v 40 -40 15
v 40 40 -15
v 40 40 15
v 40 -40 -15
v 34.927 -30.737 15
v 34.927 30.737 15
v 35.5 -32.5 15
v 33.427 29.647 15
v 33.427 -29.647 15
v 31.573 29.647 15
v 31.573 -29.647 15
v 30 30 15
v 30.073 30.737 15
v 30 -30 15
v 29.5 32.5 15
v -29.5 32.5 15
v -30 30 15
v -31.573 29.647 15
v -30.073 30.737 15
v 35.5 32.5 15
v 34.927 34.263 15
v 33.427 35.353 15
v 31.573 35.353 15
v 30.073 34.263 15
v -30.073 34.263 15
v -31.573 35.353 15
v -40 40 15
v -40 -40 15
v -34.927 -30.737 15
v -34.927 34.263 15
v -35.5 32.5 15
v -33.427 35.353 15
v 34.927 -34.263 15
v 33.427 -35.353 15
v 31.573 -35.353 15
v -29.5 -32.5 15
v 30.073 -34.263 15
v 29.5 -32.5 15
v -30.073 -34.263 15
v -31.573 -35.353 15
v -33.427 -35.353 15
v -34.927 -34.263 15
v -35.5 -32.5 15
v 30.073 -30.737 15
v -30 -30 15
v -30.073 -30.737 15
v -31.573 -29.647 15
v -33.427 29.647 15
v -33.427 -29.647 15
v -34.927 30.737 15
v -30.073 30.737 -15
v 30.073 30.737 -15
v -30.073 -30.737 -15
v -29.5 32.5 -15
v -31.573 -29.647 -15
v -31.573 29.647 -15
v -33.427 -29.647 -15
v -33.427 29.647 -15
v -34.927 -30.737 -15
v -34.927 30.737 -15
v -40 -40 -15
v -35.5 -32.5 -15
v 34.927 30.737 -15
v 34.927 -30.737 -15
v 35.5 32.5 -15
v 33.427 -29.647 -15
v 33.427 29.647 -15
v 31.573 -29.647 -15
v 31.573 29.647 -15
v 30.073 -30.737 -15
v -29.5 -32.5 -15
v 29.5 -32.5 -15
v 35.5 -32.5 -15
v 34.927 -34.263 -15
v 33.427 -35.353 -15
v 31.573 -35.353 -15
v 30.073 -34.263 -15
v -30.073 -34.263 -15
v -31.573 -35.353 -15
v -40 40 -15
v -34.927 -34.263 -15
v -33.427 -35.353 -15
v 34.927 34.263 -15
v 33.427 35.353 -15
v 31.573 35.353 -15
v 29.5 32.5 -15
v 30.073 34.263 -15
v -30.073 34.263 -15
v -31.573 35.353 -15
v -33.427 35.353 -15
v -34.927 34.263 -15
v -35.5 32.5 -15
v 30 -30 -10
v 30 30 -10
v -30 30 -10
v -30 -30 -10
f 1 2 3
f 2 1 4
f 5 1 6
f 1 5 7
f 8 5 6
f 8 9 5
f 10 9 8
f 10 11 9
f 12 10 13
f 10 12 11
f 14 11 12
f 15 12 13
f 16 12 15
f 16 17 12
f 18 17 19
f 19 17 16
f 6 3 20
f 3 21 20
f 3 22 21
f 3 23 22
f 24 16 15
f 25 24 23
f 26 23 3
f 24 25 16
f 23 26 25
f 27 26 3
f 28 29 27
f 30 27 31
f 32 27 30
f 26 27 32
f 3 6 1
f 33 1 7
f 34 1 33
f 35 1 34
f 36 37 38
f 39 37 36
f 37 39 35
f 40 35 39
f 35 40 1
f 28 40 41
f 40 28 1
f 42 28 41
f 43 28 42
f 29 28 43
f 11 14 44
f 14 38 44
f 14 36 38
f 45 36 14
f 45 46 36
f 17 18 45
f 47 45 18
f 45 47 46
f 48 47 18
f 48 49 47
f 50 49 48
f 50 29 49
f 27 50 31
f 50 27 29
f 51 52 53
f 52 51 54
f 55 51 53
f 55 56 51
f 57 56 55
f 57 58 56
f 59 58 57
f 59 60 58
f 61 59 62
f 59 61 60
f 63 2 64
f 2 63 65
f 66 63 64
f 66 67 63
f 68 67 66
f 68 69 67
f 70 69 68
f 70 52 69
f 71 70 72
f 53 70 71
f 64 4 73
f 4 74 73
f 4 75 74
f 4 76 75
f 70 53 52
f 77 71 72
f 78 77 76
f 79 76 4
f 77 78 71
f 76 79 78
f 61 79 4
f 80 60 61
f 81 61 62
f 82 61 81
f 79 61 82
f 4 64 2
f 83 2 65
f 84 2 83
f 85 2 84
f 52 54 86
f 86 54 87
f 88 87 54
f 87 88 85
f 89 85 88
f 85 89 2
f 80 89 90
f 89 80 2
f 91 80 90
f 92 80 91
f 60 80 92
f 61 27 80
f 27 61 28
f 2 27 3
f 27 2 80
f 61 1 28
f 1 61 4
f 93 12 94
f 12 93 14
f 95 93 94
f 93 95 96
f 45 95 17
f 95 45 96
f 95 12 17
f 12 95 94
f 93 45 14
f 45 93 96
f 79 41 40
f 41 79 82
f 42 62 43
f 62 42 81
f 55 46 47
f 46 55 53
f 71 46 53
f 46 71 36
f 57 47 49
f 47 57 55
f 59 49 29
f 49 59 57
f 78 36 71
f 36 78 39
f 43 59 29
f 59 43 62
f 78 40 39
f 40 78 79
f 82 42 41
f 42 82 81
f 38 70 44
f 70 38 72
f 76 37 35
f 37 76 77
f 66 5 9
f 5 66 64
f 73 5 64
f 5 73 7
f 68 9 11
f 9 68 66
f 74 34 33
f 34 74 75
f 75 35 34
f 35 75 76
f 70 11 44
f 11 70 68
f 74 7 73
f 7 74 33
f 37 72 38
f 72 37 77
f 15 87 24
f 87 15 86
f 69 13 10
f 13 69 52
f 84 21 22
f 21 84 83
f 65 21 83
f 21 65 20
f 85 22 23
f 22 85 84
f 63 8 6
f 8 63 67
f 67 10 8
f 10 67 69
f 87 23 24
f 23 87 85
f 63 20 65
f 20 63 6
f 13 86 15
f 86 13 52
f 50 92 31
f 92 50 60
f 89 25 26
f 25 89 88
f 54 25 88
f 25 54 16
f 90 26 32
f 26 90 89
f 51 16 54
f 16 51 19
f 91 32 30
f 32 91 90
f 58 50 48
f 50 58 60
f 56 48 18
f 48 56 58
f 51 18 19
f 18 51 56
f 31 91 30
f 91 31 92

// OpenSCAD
$res=1;
difference(r=3){
	cube(size = [80,80,30], center = true, r = 10);
	translate([0,0,20])  
	cube(size = [60,60,60], center = true, r = 10.0);
	translate([-32.5,-32.5,0])  
	cylinder(r=3, h=200, center=true);
	translate([32.5,-32.5,0])  
	cylinder(r=3, h=200, center=true);
	translate([32.5,32.5,0])  
	cylinder(r=3, h=200, center=true);
	translate([-32.5,32.5,0])  
	cylinder(r=3, h=200, center=true);
}
